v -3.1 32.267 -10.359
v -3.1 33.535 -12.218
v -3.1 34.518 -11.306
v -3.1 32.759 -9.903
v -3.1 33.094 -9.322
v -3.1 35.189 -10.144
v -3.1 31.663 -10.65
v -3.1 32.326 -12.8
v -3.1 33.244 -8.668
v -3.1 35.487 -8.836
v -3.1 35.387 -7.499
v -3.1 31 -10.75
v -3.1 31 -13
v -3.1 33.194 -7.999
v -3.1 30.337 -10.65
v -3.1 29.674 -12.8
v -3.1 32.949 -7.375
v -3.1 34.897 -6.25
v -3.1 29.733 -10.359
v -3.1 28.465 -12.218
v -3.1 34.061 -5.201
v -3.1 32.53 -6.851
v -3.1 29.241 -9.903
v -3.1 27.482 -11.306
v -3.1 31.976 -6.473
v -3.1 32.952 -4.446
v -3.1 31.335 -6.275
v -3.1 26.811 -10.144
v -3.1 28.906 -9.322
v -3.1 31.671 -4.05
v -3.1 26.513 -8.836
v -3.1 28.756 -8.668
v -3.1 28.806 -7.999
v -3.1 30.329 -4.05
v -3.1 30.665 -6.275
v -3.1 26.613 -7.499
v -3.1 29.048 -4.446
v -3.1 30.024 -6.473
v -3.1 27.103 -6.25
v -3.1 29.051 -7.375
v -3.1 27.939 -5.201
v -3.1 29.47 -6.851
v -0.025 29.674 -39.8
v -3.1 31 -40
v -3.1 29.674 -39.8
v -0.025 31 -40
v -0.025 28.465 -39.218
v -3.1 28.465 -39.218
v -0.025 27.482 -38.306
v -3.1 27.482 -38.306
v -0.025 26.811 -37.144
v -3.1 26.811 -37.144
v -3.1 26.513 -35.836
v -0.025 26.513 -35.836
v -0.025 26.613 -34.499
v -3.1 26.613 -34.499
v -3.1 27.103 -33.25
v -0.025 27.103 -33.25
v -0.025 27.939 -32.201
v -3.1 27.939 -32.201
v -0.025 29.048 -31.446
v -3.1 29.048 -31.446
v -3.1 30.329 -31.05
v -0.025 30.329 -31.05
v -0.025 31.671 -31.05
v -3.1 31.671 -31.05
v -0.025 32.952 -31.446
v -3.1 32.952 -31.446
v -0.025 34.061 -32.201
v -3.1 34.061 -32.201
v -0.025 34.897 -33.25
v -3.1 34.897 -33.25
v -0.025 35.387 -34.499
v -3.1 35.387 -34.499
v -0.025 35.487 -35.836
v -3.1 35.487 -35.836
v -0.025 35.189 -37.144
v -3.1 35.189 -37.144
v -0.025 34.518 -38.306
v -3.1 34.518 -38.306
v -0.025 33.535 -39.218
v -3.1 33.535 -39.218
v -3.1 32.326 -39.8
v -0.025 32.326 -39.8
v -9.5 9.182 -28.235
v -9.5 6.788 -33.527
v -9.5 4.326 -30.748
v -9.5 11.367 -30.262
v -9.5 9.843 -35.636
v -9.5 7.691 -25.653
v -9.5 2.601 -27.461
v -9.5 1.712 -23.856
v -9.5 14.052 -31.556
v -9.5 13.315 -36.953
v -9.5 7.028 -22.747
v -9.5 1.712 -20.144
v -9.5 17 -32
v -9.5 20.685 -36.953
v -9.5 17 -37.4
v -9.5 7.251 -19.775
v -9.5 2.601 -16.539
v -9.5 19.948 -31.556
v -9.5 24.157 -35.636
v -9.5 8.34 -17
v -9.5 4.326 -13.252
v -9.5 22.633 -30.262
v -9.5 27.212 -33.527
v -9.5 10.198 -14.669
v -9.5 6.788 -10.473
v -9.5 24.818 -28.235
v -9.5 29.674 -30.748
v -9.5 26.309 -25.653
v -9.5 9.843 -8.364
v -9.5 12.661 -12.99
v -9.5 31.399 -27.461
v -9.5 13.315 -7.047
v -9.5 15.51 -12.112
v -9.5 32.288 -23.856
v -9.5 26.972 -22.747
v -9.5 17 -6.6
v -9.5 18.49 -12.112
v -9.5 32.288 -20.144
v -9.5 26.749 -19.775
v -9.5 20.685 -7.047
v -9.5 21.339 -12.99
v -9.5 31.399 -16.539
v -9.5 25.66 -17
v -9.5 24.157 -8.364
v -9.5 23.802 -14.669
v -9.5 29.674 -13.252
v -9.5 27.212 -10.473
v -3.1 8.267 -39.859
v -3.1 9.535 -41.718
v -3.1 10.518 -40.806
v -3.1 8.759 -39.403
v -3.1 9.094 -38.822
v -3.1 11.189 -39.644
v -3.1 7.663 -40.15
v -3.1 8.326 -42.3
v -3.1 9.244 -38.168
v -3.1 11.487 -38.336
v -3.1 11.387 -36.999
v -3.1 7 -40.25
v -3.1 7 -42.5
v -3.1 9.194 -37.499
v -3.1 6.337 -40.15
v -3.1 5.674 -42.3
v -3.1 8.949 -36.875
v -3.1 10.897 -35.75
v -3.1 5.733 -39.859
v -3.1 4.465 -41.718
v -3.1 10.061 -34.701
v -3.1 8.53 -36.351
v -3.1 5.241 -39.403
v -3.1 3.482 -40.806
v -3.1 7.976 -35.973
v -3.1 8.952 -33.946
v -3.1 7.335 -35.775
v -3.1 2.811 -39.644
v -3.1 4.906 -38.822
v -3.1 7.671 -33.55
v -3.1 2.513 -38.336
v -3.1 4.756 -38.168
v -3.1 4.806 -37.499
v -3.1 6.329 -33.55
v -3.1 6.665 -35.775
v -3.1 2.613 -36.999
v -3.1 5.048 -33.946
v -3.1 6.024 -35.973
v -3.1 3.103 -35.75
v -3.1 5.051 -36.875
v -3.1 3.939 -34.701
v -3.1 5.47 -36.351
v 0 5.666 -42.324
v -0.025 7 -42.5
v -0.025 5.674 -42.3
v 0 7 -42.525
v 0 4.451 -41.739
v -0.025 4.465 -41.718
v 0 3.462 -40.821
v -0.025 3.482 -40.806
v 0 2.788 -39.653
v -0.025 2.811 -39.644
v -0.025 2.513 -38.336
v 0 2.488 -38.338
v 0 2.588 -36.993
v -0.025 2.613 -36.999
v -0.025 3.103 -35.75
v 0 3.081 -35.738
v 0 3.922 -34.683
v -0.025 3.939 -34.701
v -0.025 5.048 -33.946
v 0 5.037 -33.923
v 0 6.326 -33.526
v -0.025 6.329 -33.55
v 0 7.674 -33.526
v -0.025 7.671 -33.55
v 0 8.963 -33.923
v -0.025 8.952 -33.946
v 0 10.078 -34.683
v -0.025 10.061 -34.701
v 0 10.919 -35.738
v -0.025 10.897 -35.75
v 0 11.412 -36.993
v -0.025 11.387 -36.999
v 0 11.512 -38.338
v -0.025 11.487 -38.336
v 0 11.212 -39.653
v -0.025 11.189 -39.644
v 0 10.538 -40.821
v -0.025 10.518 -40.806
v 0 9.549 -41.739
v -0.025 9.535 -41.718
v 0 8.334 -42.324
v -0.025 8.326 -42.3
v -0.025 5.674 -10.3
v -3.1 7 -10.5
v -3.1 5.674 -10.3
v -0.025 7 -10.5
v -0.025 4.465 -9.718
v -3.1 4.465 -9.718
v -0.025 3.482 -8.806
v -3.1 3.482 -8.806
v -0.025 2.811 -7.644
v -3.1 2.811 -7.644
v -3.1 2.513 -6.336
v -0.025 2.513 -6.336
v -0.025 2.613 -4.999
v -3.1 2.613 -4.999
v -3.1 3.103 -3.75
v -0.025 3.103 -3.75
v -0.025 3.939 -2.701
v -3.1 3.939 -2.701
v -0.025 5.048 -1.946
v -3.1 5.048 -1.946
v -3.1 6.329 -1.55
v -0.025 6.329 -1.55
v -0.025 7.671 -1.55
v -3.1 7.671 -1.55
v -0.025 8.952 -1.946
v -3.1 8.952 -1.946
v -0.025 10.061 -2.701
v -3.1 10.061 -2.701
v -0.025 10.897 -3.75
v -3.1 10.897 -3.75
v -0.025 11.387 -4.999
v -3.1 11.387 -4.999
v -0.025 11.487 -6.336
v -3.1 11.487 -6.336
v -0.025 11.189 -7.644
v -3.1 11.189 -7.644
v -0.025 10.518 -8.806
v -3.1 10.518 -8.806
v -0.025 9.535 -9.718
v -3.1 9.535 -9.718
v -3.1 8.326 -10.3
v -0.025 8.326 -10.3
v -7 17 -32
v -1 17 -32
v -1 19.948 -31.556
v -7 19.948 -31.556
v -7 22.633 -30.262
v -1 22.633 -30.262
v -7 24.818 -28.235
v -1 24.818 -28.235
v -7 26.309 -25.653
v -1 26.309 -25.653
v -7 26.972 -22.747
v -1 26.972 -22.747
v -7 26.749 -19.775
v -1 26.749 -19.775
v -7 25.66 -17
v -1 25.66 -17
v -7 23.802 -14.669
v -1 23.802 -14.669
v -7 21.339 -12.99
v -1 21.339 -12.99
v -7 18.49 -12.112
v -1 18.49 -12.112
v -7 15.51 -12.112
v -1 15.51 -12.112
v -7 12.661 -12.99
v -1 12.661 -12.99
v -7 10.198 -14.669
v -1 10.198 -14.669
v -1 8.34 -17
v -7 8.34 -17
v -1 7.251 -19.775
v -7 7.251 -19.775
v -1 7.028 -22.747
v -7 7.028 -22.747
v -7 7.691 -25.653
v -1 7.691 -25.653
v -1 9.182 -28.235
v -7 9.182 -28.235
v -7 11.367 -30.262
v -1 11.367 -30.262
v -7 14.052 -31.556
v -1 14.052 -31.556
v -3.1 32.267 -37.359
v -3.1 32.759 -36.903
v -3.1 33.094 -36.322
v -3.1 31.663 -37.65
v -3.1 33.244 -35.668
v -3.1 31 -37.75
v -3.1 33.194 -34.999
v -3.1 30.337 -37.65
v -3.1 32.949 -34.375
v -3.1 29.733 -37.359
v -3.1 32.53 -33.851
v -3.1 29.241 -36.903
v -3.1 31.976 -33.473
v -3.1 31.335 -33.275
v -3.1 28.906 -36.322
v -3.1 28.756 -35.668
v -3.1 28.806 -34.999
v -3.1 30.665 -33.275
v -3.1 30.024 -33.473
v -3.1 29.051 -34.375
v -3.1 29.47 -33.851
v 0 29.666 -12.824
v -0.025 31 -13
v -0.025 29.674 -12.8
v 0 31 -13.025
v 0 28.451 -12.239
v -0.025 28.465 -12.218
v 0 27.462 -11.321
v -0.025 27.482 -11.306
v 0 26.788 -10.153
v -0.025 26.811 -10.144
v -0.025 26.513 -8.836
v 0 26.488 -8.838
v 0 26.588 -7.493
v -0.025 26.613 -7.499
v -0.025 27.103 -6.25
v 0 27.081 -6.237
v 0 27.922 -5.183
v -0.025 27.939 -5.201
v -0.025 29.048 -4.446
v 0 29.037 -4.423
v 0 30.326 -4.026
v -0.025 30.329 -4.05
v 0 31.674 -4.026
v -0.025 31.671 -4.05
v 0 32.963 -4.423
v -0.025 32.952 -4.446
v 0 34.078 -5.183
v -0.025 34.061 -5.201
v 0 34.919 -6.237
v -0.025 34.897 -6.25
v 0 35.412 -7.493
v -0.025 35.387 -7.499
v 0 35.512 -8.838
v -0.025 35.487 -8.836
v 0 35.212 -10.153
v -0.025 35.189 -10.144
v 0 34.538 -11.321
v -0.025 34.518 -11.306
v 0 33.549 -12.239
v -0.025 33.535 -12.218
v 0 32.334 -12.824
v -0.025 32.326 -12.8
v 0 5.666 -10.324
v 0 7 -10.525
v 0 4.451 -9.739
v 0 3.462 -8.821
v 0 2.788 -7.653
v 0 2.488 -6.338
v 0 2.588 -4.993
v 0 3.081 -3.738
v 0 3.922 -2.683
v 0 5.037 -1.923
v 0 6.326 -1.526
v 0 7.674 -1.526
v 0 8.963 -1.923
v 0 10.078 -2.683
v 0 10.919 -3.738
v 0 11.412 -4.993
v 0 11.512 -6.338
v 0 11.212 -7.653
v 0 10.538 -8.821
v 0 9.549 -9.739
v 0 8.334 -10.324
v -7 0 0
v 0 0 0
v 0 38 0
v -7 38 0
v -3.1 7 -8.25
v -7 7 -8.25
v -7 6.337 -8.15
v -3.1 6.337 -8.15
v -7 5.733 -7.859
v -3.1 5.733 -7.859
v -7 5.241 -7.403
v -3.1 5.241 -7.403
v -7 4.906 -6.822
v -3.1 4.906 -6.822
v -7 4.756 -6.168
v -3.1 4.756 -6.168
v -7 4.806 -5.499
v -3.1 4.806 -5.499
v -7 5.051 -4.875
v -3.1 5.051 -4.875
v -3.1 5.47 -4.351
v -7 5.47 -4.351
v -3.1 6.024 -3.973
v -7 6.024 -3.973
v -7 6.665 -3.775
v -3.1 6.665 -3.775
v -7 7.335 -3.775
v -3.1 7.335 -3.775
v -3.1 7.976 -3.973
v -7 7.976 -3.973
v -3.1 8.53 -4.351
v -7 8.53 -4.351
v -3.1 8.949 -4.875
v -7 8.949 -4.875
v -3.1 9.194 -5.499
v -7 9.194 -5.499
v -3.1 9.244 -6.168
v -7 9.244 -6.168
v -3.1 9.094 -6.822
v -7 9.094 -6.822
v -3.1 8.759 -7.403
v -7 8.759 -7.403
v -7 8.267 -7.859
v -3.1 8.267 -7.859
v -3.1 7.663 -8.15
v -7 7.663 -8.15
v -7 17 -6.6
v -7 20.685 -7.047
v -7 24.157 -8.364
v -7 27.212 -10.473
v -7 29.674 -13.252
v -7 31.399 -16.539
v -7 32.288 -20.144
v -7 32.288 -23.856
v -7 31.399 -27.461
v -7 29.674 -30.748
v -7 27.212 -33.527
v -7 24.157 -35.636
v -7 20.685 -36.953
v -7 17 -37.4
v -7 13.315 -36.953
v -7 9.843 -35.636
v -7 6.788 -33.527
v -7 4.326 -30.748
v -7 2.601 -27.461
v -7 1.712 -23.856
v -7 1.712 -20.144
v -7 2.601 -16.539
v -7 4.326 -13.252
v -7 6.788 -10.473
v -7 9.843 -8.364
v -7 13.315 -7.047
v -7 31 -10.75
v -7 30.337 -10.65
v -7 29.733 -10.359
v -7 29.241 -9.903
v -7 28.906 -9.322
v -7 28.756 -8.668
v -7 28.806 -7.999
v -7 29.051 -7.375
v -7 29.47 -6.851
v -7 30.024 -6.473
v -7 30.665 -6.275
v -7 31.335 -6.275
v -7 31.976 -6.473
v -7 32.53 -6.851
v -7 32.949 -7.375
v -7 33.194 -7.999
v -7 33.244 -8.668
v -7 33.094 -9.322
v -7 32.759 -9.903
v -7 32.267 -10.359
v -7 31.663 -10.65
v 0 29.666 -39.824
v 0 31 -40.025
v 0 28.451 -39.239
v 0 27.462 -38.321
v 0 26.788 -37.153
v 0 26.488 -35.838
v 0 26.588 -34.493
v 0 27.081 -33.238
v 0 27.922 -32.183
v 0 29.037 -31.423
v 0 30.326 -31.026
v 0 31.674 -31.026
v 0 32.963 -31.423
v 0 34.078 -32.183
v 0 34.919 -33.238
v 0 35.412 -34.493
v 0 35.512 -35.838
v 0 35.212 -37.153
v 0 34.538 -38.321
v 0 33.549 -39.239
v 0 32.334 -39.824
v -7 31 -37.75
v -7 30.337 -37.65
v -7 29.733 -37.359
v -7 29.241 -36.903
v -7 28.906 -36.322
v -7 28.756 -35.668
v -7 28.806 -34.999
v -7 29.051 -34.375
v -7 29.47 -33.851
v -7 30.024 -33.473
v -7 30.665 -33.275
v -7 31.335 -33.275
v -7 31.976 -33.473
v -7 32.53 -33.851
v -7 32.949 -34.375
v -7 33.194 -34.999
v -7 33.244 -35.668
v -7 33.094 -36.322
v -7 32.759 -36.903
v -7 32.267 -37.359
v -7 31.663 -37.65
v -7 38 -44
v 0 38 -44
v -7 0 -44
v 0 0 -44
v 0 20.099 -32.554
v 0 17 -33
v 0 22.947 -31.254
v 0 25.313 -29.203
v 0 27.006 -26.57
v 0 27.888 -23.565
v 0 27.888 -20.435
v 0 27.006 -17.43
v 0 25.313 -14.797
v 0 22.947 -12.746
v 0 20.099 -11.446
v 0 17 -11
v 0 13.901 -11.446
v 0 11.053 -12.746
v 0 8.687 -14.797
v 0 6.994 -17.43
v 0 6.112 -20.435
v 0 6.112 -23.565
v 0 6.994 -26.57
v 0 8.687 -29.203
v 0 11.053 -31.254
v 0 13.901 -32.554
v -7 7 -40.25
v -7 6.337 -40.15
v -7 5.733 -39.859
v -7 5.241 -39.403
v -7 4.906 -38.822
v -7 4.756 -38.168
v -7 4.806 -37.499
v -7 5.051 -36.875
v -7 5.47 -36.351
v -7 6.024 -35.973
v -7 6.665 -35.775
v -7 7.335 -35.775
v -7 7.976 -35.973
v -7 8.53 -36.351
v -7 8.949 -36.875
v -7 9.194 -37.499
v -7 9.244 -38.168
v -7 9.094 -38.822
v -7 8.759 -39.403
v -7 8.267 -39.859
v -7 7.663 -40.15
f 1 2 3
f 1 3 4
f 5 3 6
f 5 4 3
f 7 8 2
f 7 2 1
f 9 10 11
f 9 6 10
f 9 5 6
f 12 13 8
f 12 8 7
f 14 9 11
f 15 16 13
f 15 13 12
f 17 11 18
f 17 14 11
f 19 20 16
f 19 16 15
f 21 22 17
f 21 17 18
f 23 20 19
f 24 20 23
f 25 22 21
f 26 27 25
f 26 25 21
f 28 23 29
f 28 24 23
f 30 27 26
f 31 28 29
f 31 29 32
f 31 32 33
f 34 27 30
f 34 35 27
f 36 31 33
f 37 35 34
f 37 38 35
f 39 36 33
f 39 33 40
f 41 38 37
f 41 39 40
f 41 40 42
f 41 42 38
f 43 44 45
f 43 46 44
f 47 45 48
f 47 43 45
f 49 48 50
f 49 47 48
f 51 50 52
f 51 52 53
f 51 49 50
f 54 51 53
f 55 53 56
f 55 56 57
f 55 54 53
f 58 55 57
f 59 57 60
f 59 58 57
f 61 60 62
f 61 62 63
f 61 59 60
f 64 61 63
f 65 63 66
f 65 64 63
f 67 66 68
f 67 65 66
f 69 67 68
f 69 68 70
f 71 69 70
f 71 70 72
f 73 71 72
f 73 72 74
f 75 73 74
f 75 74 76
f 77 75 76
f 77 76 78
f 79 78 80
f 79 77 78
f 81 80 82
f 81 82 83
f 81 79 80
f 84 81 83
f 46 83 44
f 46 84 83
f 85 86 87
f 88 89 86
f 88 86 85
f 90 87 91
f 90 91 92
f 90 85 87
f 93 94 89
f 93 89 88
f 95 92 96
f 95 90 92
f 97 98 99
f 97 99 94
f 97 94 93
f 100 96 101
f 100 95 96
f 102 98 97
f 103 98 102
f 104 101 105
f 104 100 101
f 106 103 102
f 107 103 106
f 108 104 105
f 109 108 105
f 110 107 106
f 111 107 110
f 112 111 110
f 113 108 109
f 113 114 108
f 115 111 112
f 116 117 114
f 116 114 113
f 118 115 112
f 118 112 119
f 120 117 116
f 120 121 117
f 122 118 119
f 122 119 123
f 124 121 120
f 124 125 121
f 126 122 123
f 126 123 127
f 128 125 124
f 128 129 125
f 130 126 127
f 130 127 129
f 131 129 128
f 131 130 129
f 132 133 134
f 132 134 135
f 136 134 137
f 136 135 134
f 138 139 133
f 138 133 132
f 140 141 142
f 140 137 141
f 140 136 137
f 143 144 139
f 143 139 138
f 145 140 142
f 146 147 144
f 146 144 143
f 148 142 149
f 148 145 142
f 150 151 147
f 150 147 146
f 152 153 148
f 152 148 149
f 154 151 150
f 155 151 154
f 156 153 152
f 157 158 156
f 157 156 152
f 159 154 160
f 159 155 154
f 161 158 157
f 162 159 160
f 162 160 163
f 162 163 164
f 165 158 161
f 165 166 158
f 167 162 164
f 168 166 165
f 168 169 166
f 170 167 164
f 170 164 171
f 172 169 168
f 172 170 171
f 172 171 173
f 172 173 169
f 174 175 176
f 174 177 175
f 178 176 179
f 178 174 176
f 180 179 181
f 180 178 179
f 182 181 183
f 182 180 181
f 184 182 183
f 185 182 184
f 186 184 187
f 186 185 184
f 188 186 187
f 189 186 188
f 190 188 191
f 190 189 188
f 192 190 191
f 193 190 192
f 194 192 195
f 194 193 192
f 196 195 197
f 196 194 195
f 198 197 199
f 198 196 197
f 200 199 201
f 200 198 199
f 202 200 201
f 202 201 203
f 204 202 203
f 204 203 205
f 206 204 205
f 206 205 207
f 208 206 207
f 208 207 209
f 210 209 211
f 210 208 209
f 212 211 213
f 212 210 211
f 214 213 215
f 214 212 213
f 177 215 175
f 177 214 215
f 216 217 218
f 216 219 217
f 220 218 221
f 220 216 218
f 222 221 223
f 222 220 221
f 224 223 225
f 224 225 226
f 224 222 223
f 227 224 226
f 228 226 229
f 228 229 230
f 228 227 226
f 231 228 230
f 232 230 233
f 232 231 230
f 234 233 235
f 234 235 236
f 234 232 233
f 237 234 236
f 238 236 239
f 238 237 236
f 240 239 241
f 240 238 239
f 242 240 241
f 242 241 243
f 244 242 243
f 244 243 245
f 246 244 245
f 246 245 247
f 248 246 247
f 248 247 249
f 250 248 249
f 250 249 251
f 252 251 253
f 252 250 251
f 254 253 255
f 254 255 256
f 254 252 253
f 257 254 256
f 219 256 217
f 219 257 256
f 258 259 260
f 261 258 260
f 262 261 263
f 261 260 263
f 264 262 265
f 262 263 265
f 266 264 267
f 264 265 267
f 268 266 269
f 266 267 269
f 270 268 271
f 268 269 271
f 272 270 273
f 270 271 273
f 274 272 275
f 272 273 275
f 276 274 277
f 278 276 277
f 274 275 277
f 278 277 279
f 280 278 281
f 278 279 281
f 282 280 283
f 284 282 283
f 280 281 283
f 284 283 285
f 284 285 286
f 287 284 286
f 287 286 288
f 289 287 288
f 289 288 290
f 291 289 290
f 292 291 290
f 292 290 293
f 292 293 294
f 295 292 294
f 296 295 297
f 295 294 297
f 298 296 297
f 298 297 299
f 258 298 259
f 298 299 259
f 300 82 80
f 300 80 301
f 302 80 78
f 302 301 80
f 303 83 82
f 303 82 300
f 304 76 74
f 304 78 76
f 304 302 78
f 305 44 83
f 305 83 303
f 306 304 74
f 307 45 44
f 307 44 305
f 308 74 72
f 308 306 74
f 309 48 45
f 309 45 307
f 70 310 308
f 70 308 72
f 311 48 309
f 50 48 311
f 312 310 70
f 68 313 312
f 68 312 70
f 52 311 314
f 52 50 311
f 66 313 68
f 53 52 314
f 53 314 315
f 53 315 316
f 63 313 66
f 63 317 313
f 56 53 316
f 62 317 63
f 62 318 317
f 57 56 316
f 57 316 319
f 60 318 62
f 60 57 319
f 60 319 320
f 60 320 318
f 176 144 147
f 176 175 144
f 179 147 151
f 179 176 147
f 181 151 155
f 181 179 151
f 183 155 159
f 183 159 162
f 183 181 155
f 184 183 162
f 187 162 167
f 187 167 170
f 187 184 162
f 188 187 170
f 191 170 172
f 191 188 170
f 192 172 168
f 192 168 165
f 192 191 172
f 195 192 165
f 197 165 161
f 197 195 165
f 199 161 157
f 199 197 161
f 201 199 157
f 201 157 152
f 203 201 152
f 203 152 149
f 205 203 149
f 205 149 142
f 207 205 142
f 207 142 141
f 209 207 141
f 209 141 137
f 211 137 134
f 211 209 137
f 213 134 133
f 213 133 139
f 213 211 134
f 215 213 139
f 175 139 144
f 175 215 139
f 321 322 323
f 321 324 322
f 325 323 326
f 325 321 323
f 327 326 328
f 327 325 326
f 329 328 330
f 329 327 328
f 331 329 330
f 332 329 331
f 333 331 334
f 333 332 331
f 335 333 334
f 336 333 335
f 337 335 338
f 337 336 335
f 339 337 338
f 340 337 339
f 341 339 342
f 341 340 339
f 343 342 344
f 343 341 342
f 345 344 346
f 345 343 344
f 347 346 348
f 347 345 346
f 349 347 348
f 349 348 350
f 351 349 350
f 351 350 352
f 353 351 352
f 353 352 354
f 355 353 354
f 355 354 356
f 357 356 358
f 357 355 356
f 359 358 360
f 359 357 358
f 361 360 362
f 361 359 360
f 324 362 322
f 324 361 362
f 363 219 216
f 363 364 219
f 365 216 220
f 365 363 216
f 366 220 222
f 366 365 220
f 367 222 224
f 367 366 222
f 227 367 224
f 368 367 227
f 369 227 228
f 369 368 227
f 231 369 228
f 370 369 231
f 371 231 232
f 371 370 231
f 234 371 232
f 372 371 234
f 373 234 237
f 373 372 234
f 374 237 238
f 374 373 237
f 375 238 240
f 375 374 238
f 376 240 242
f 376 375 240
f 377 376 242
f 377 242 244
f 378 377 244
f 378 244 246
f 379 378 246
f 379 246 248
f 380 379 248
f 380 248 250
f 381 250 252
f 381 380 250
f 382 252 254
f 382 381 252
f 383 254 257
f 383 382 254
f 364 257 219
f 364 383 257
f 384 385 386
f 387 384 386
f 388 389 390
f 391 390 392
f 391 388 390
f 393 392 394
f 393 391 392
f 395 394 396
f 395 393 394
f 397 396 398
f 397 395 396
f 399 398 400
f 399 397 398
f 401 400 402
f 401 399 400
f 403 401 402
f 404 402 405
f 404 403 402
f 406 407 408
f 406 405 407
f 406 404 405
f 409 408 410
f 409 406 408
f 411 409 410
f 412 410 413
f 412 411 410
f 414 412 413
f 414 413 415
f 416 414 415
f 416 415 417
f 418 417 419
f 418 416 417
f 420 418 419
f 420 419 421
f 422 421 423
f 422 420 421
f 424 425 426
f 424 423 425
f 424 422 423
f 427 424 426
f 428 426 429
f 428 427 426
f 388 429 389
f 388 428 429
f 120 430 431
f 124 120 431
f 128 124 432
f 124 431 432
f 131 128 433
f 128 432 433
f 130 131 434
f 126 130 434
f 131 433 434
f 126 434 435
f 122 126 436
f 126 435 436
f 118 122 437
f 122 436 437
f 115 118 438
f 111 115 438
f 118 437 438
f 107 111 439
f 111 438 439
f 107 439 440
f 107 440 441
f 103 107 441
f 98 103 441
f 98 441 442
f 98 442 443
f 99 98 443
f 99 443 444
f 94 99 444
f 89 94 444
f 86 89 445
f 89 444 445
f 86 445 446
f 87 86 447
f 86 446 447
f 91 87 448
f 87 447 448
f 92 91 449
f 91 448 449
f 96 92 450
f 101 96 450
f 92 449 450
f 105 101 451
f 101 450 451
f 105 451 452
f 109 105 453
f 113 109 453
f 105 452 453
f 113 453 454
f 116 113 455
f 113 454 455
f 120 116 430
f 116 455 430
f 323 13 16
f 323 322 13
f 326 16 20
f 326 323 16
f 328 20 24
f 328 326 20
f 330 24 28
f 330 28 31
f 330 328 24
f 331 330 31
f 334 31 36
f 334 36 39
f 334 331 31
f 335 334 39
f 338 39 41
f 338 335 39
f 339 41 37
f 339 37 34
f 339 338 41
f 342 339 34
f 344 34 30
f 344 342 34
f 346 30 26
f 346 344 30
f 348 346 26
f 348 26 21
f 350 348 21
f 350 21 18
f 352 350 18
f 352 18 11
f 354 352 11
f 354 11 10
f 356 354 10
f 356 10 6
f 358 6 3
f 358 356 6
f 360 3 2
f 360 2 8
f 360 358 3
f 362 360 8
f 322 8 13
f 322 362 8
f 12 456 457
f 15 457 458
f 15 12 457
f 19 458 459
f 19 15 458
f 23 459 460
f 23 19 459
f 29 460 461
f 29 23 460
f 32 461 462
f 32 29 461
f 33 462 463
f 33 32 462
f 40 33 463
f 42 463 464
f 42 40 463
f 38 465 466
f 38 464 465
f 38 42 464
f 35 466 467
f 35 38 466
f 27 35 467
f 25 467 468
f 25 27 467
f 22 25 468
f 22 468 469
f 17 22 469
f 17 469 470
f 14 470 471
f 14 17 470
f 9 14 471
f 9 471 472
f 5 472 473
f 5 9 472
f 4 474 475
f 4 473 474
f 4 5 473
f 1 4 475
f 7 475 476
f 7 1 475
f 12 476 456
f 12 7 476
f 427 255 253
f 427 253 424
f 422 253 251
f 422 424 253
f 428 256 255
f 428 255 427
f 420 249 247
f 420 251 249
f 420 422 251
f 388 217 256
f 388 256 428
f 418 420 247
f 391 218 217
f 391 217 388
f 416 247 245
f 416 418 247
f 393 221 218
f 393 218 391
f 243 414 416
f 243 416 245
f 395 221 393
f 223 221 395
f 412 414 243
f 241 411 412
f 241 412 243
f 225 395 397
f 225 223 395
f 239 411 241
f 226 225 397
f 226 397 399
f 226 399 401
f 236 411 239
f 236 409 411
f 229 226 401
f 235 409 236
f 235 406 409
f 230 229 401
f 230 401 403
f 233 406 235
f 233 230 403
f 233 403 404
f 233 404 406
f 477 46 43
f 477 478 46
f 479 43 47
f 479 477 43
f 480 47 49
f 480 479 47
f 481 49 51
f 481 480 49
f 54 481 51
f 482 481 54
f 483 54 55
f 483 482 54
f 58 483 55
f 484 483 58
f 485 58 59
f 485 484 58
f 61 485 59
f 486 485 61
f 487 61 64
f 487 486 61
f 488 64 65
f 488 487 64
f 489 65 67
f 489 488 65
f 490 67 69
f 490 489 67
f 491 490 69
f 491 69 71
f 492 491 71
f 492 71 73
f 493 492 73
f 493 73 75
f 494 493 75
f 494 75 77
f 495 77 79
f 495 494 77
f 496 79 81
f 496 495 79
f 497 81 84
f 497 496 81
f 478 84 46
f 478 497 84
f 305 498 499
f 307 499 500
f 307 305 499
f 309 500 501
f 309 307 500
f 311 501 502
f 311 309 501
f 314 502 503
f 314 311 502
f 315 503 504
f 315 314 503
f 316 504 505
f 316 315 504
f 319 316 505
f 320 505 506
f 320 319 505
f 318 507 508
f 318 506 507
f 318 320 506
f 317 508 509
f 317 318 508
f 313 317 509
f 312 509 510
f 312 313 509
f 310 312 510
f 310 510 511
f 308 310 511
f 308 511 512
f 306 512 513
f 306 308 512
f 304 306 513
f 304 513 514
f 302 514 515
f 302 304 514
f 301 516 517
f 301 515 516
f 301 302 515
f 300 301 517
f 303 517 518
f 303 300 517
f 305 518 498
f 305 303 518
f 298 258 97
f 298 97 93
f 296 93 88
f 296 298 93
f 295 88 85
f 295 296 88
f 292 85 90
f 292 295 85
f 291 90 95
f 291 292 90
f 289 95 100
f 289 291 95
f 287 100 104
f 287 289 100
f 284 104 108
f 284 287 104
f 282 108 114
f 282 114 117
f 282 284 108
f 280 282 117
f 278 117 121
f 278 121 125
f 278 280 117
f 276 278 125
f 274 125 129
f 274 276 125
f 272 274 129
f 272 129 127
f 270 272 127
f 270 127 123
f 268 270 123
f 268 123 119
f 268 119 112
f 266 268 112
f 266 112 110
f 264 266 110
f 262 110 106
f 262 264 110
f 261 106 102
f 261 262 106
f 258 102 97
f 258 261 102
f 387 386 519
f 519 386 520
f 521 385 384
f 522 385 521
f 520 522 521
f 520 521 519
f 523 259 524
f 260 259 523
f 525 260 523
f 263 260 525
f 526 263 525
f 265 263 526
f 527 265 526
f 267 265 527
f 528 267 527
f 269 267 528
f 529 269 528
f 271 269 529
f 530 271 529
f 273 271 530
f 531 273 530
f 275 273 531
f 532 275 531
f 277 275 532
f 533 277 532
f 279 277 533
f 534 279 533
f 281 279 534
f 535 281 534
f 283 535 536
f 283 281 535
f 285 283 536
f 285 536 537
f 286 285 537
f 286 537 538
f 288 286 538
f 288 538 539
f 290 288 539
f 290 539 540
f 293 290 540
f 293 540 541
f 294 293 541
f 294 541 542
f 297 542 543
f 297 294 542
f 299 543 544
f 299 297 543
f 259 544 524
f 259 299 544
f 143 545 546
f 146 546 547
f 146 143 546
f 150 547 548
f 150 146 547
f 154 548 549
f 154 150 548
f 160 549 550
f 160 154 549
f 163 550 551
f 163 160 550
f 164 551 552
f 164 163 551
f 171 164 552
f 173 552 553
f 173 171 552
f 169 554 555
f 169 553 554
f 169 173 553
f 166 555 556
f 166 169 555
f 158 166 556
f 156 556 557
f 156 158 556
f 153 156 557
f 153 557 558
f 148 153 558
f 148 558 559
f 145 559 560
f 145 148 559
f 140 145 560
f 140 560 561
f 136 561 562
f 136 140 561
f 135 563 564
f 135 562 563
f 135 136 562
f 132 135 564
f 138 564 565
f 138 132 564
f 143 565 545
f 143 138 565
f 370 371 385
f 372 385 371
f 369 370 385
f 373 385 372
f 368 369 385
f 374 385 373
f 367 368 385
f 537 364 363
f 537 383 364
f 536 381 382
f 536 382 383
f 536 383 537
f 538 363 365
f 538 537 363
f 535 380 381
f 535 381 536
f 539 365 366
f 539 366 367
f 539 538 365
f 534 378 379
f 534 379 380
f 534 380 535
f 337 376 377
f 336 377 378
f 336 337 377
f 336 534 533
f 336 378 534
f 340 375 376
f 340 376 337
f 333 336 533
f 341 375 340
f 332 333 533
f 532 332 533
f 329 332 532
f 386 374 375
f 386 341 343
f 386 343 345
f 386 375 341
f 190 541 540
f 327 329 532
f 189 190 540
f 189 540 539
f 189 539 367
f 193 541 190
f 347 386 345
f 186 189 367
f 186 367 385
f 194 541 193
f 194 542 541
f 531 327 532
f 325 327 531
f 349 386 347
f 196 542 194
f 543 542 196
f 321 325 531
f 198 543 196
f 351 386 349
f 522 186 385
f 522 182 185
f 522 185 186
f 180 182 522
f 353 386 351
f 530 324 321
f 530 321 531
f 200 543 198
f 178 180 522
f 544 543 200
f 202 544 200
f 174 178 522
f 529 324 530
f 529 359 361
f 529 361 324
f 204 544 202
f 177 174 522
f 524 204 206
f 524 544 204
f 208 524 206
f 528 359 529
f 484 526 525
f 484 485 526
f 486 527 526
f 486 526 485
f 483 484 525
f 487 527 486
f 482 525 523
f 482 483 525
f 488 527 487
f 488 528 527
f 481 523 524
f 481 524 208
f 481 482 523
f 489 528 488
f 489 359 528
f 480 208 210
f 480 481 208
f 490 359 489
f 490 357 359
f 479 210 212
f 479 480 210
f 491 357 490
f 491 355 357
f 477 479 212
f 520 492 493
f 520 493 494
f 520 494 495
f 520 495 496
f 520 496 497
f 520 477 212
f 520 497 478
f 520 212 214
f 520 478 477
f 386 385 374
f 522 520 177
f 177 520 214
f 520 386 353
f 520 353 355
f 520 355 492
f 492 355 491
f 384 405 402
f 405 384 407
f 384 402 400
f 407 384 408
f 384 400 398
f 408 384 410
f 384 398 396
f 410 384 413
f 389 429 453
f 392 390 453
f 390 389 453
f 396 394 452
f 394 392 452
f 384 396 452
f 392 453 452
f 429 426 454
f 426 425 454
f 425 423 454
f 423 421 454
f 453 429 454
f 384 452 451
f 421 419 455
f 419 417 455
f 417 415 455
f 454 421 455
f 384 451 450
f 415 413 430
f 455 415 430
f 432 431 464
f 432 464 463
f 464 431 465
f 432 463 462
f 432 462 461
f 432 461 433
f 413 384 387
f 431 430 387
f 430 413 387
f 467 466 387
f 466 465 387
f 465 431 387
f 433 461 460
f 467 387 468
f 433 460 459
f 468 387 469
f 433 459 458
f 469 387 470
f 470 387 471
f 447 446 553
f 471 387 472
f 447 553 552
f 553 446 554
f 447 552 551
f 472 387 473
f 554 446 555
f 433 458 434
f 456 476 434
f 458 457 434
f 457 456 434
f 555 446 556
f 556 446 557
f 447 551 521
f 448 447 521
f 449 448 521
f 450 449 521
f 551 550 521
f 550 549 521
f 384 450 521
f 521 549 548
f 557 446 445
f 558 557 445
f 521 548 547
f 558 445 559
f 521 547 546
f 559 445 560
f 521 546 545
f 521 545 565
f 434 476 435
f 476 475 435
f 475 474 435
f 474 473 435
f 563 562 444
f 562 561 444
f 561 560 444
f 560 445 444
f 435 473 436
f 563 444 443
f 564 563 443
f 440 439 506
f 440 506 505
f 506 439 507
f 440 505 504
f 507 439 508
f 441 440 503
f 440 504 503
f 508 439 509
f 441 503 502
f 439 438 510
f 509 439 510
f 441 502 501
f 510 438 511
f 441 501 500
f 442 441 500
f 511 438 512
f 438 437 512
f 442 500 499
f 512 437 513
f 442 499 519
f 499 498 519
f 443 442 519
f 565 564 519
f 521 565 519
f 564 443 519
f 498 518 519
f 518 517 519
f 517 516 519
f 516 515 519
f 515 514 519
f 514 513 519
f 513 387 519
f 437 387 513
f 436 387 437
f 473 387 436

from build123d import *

# Parameters (mm, degrees)
ESBO_O1_W                                    = 44
ESBO_O1_H                                    = 38
ESBO_O1_R                                    = 10
RESSALTO_EXTRUS_O1_DEPTH                     = 7
ESBO_O2_R                                    = 15.4
ESBO_O2_R_2                                  = 10
RESSALTO_EXTRUS_O2_DEPTH                     = 2.5
CHANFRO1_SIZE                                = 1
REBAIXO_PARA_PARAFUSO_COM_CABE_A_PAN_2_COUNT = 2
REBAIXO_PARA_PARAFUSO_COM_CABE_A_PAN_2_PITCH = 27
REBAIXO_PARA_PARAFUSO_COM_CABE_A_PAN_3_COUNT = 2
REBAIXO_PARA_PARAFUSO_COM_CABE_A_PAN_3_PITCH = 38.02959374
REBAIXO_PARA_PARAFUSO_COM_CABE_A_PAN_4_COUNT = 2
REBAIXO_PARA_PARAFUSO_COM_CABE_A_PAN_4_PITCH = 24.129857024


with BuildPart() as part:
    # Esboço1 → Ressalto-extrusão1 (new body)
    with BuildSketch(Plane(origin=(0, 0, 0), x_dir=(0, 0, -1), z_dir=(1, 0, 0))):
        with Locations((22, 19)):
            Rectangle(ESBO_O1_W, ESBO_O1_H)
        with Locations((22, 17)):
            Circle(ESBO_O1_R, mode=Mode.SUBTRACT)
    extrude(amount=-RESSALTO_EXTRUS_O1_DEPTH)

    # Esboço2 → Ressalto-extrusão2 (add)
    with BuildSketch(Plane.ZY.offset(7)):
        with Locations((-22, 17)):
            Circle(ESBO_O2_R)
        with Locations(Location((-22, 17, 0), (0, 0, 180))):
            Circle(ESBO_O2_R_2, mode=Mode.SUBTRACT)
    extrude(amount=RESSALTO_EXTRUS_O2_DEPTH)

    # Chanfro1
    chanfro1_edges = [part.edges().sort_by_distance(p)[0] for p in [
        (0, 17, -12),
    ]]
    chamfer(chanfro1_edges, length=CHANFRO1_SIZE)

    # Esboço4 → Rebaixo para parafuso com cabeça panela de M41 (revolve, cut)
    with BuildSketch(Plane(origin=(0, 31, -8.5), x_dir=(0, 0, -1), z_dir=(0, 1, 0))):
        Polygon((0, 0), (0, 9.5), (2.25, 9.5), (2.25, 3.1), (4.5, 3.1), (4.5, 0.025), (4.525, 0), align=None)
    rebaixo_para_parafuso_com_cabe_a_panela = revolve(axis=Axis((6.35, 31, -8.5), (-1, 0, 0)), mode=Mode.SUBTRACT)

    # Rebaixo para parafuso com cabe_a pan 2: Rebaixo para parafuso com cabeça panela de M41 ×2
    with Locations(*[(0, 0, -i * REBAIXO_PARA_PARAFUSO_COM_CABE_A_PAN_2_PITCH) for i in range(1, REBAIXO_PARA_PARAFUSO_COM_CABE_A_PAN_2_COUNT)]):
        add(rebaixo_para_parafuso_com_cabe_a_panela, mode=Mode.SUBTRACT)

    # Rebaixo para parafuso com cabe_a pan 3: Rebaixo para parafuso com cabeça panela de M41 ×2
    with Locations(*[Vector(0, -0.6310874674162201, -0.7757116786991037) * (i * REBAIXO_PARA_PARAFUSO_COM_CABE_A_PAN_3_PITCH) for i in range(1, REBAIXO_PARA_PARAFUSO_COM_CABE_A_PAN_3_COUNT)]):
        add(rebaixo_para_parafuso_com_cabe_a_panela, mode=Mode.SUBTRACT)

    # Rebaixo para parafuso com cabe_a pan 4: Rebaixo para parafuso com cabeça panela de M41 ×2
    with Locations(*[Vector(0, -0.9946184088907778, 0.10360608425945594) * (i * REBAIXO_PARA_PARAFUSO_COM_CABE_A_PAN_4_PITCH) for i in range(1, REBAIXO_PARA_PARAFUSO_COM_CABE_A_PAN_4_COUNT)]):
        add(rebaixo_para_parafuso_com_cabe_a_panela, mode=Mode.SUBTRACT)


solid = part.part
